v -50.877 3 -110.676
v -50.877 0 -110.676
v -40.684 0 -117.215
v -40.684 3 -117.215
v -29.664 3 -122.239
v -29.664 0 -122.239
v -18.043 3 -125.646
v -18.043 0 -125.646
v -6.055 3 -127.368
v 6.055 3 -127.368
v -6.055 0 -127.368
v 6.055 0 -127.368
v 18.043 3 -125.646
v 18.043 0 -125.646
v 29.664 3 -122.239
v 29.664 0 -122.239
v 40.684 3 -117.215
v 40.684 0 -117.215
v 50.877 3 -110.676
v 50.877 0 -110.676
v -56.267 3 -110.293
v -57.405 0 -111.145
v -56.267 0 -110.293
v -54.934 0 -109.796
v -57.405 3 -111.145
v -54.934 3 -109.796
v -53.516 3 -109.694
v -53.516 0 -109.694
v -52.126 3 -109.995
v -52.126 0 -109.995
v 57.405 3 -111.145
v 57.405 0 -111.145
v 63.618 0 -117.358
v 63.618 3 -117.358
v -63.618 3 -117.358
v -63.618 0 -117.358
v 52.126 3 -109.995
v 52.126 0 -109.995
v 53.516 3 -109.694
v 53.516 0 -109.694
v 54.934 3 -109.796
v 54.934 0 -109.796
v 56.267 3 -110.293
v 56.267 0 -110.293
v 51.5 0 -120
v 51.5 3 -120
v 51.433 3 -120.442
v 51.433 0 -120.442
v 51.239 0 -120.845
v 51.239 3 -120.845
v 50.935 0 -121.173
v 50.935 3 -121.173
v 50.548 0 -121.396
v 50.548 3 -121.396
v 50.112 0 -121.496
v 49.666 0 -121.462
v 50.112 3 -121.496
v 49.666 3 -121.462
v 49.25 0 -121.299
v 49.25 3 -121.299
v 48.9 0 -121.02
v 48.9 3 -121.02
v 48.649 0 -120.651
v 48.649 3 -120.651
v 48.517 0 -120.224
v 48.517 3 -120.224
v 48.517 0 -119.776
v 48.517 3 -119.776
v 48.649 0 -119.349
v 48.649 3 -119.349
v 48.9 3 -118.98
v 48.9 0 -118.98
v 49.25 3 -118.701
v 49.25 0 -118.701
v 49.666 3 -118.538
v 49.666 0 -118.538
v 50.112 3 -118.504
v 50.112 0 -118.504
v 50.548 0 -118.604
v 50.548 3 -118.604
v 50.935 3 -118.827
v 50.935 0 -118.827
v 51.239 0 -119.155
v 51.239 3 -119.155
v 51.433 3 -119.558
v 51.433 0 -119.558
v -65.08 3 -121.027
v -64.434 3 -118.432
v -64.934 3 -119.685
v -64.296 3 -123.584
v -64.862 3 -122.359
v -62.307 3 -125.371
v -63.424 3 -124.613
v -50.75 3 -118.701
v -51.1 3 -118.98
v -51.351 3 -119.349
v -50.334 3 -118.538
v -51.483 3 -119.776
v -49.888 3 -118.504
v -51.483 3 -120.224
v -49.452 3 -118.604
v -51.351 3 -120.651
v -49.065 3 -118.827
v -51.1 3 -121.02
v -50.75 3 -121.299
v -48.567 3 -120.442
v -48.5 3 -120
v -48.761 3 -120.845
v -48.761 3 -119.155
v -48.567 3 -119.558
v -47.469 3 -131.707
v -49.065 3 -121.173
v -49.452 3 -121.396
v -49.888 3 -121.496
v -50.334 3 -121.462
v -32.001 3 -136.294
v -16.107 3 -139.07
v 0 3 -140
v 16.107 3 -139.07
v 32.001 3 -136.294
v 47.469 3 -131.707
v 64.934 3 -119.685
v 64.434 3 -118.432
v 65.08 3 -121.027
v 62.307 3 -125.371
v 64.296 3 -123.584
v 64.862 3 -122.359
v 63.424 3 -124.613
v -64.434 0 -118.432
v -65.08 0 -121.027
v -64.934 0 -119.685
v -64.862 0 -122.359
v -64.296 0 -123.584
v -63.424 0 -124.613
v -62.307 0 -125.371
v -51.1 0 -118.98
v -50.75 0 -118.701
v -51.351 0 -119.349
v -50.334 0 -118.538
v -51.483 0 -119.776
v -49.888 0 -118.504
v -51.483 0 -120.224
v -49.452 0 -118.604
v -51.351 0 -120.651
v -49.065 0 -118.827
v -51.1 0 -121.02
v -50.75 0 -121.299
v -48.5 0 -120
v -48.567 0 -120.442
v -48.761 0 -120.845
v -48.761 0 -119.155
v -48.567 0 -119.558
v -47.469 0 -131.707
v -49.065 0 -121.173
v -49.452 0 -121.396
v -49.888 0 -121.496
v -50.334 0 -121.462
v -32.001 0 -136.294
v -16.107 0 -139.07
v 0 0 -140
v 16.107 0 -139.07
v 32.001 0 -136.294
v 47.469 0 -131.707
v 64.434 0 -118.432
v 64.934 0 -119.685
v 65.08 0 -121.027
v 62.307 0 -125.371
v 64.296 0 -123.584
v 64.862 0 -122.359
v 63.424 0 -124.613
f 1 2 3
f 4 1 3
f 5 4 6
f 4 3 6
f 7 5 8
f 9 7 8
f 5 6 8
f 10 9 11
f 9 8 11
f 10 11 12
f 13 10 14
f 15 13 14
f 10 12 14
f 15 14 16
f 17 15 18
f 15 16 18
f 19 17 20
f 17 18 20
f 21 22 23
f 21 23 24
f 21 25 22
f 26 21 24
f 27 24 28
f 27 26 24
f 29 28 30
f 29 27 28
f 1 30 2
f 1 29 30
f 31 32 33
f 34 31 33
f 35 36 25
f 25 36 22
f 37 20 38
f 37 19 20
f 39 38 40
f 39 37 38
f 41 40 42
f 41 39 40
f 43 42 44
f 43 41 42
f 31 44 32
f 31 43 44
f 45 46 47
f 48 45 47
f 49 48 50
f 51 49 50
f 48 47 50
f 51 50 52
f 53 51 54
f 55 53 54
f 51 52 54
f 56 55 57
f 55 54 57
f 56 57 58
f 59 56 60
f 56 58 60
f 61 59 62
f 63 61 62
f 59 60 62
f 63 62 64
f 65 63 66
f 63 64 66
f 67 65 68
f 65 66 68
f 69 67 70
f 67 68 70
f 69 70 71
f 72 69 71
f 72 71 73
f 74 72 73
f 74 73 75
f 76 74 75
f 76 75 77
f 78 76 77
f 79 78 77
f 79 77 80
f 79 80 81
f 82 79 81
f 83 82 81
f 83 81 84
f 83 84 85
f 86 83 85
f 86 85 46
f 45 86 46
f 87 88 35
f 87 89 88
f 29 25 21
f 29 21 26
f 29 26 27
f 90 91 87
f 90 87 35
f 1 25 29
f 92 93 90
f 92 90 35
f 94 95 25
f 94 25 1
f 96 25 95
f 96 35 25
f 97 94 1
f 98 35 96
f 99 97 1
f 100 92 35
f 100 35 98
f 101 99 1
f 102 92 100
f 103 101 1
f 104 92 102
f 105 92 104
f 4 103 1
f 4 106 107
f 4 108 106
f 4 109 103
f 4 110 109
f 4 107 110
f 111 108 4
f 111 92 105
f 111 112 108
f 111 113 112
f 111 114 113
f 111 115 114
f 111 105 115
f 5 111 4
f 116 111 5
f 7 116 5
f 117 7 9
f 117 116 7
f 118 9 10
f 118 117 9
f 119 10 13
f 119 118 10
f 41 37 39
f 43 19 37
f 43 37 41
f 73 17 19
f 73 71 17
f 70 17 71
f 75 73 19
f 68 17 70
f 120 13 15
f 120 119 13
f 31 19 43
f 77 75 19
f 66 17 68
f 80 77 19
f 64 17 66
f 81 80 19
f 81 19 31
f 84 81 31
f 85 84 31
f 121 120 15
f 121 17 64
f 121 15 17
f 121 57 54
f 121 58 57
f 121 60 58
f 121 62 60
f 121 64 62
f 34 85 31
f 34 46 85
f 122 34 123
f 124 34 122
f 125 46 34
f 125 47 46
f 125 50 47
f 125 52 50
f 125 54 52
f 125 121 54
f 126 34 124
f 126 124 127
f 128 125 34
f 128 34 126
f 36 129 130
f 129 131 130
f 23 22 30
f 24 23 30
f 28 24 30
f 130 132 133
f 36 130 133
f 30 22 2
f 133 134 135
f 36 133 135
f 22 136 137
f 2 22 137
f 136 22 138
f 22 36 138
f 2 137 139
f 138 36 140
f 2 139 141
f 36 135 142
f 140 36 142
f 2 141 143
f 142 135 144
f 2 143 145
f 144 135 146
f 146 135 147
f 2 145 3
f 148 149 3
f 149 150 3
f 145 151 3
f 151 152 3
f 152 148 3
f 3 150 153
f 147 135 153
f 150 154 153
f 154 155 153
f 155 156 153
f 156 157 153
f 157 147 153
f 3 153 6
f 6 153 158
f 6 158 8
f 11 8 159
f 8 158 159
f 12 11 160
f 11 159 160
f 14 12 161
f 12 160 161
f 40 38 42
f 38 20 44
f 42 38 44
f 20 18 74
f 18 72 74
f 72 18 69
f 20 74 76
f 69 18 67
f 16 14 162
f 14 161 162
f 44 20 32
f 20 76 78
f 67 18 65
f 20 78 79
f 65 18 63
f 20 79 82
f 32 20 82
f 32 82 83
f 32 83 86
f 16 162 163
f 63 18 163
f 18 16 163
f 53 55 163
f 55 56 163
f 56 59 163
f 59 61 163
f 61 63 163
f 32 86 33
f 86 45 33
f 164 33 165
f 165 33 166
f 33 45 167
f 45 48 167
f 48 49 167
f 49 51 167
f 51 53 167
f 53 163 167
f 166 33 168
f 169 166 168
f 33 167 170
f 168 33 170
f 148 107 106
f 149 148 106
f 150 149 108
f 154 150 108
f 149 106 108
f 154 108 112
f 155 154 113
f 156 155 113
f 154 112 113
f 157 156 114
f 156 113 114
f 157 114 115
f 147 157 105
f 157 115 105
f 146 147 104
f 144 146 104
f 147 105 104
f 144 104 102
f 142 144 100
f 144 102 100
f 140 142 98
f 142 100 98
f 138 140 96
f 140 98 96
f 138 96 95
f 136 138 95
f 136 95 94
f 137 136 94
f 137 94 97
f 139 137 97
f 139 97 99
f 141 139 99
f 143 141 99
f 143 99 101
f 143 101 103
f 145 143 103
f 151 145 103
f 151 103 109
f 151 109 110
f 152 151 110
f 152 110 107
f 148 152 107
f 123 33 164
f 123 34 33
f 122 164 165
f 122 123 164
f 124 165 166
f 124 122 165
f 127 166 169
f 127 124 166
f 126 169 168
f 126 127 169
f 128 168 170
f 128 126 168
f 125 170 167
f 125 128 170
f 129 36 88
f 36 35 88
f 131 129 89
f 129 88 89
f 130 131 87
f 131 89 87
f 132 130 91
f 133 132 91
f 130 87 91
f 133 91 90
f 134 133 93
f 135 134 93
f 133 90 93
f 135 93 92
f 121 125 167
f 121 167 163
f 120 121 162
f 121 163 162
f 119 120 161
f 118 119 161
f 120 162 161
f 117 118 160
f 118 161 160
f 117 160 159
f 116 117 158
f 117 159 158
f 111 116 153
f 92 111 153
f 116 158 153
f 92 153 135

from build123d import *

# Parameters (mm, degrees)
BOSS_EXTRUDE1_DEPTH = 3
FILLET1_R           = 5
CUT_EXTRUDE1_REACH  = 5
SKETCH2_R           = 1.5


with BuildPart() as part:
    # Sketch1 → Boss-Extrude1 (new body)
    with BuildSketch(Plane(origin=(0, 0, 0), x_dir=(1, 0, 0), z_dir=(0, 1, 0))):
        with BuildLine():
            Line((-68.408481347, 122.148596717), (-54.266345723, 108.006461093))
            ThreePointArc((-54.266345723, 108.006461093), (0, 127.583500889), (54.266345723, 108.006461093))
            Line((54.266345723, 108.006461093), (68.408481347, 122.148596717))
            ThreePointArc((68.408481347, 122.148596717), (0, 140), (-68.408481347, 122.148596717))
        make_face()
    extrude(amount=BOSS_EXTRUDE1_DEPTH)

    # Fillet1
    fillet1_edges = [part.edges().sort_by_distance(p)[0] for p in [
        (68.408481347, 1.5, -122.148596717),
        (54.266345723, 1.5, -108.006461093),
        (-54.266345723, 1.5, -108.006461093),
        (-68.408481347, 1.5, -122.148596717),
    ]]
    fillet(fillet1_edges, radius=FILLET1_R)

    # Sketch2 → Cut-Extrude1 (cut, up to next)
    with BuildSketch(Plane(origin=(0, 3, 0), x_dir=(1, 0, 0), z_dir=(0, 1, 0)), mode=Mode.PRIVATE) as cut_extrude1_sk1:
        with Locations((-50, 120)):
            Circle(SKETCH2_R)
    cut_extrude1_tool1 = extrude(cut_extrude1_sk1.sketch, amount=-CUT_EXTRUDE1_REACH, mode=Mode.PRIVATE) & part.part
    add(cut_extrude1_tool1.solids().sort_by_distance((-50, 3, -120))[0], mode=Mode.SUBTRACT)
    # Sketch2 → Cut-Extrude1 (cut, up to next)
    with BuildSketch(Plane(origin=(0, 3, 0), x_dir=(1, 0, 0), z_dir=(0, 1, 0)), mode=Mode.PRIVATE) as cut_extrude1_sk2:
        with Locations((50, 120)):
            Circle(SKETCH2_R)
    cut_extrude1_tool2 = extrude(cut_extrude1_sk2.sketch, amount=-CUT_EXTRUDE1_REACH, mode=Mode.PRIVATE) & part.part
    add(cut_extrude1_tool2.solids().sort_by_distance((50, 3, -120))[0], mode=Mode.SUBTRACT)


solid = part.part
